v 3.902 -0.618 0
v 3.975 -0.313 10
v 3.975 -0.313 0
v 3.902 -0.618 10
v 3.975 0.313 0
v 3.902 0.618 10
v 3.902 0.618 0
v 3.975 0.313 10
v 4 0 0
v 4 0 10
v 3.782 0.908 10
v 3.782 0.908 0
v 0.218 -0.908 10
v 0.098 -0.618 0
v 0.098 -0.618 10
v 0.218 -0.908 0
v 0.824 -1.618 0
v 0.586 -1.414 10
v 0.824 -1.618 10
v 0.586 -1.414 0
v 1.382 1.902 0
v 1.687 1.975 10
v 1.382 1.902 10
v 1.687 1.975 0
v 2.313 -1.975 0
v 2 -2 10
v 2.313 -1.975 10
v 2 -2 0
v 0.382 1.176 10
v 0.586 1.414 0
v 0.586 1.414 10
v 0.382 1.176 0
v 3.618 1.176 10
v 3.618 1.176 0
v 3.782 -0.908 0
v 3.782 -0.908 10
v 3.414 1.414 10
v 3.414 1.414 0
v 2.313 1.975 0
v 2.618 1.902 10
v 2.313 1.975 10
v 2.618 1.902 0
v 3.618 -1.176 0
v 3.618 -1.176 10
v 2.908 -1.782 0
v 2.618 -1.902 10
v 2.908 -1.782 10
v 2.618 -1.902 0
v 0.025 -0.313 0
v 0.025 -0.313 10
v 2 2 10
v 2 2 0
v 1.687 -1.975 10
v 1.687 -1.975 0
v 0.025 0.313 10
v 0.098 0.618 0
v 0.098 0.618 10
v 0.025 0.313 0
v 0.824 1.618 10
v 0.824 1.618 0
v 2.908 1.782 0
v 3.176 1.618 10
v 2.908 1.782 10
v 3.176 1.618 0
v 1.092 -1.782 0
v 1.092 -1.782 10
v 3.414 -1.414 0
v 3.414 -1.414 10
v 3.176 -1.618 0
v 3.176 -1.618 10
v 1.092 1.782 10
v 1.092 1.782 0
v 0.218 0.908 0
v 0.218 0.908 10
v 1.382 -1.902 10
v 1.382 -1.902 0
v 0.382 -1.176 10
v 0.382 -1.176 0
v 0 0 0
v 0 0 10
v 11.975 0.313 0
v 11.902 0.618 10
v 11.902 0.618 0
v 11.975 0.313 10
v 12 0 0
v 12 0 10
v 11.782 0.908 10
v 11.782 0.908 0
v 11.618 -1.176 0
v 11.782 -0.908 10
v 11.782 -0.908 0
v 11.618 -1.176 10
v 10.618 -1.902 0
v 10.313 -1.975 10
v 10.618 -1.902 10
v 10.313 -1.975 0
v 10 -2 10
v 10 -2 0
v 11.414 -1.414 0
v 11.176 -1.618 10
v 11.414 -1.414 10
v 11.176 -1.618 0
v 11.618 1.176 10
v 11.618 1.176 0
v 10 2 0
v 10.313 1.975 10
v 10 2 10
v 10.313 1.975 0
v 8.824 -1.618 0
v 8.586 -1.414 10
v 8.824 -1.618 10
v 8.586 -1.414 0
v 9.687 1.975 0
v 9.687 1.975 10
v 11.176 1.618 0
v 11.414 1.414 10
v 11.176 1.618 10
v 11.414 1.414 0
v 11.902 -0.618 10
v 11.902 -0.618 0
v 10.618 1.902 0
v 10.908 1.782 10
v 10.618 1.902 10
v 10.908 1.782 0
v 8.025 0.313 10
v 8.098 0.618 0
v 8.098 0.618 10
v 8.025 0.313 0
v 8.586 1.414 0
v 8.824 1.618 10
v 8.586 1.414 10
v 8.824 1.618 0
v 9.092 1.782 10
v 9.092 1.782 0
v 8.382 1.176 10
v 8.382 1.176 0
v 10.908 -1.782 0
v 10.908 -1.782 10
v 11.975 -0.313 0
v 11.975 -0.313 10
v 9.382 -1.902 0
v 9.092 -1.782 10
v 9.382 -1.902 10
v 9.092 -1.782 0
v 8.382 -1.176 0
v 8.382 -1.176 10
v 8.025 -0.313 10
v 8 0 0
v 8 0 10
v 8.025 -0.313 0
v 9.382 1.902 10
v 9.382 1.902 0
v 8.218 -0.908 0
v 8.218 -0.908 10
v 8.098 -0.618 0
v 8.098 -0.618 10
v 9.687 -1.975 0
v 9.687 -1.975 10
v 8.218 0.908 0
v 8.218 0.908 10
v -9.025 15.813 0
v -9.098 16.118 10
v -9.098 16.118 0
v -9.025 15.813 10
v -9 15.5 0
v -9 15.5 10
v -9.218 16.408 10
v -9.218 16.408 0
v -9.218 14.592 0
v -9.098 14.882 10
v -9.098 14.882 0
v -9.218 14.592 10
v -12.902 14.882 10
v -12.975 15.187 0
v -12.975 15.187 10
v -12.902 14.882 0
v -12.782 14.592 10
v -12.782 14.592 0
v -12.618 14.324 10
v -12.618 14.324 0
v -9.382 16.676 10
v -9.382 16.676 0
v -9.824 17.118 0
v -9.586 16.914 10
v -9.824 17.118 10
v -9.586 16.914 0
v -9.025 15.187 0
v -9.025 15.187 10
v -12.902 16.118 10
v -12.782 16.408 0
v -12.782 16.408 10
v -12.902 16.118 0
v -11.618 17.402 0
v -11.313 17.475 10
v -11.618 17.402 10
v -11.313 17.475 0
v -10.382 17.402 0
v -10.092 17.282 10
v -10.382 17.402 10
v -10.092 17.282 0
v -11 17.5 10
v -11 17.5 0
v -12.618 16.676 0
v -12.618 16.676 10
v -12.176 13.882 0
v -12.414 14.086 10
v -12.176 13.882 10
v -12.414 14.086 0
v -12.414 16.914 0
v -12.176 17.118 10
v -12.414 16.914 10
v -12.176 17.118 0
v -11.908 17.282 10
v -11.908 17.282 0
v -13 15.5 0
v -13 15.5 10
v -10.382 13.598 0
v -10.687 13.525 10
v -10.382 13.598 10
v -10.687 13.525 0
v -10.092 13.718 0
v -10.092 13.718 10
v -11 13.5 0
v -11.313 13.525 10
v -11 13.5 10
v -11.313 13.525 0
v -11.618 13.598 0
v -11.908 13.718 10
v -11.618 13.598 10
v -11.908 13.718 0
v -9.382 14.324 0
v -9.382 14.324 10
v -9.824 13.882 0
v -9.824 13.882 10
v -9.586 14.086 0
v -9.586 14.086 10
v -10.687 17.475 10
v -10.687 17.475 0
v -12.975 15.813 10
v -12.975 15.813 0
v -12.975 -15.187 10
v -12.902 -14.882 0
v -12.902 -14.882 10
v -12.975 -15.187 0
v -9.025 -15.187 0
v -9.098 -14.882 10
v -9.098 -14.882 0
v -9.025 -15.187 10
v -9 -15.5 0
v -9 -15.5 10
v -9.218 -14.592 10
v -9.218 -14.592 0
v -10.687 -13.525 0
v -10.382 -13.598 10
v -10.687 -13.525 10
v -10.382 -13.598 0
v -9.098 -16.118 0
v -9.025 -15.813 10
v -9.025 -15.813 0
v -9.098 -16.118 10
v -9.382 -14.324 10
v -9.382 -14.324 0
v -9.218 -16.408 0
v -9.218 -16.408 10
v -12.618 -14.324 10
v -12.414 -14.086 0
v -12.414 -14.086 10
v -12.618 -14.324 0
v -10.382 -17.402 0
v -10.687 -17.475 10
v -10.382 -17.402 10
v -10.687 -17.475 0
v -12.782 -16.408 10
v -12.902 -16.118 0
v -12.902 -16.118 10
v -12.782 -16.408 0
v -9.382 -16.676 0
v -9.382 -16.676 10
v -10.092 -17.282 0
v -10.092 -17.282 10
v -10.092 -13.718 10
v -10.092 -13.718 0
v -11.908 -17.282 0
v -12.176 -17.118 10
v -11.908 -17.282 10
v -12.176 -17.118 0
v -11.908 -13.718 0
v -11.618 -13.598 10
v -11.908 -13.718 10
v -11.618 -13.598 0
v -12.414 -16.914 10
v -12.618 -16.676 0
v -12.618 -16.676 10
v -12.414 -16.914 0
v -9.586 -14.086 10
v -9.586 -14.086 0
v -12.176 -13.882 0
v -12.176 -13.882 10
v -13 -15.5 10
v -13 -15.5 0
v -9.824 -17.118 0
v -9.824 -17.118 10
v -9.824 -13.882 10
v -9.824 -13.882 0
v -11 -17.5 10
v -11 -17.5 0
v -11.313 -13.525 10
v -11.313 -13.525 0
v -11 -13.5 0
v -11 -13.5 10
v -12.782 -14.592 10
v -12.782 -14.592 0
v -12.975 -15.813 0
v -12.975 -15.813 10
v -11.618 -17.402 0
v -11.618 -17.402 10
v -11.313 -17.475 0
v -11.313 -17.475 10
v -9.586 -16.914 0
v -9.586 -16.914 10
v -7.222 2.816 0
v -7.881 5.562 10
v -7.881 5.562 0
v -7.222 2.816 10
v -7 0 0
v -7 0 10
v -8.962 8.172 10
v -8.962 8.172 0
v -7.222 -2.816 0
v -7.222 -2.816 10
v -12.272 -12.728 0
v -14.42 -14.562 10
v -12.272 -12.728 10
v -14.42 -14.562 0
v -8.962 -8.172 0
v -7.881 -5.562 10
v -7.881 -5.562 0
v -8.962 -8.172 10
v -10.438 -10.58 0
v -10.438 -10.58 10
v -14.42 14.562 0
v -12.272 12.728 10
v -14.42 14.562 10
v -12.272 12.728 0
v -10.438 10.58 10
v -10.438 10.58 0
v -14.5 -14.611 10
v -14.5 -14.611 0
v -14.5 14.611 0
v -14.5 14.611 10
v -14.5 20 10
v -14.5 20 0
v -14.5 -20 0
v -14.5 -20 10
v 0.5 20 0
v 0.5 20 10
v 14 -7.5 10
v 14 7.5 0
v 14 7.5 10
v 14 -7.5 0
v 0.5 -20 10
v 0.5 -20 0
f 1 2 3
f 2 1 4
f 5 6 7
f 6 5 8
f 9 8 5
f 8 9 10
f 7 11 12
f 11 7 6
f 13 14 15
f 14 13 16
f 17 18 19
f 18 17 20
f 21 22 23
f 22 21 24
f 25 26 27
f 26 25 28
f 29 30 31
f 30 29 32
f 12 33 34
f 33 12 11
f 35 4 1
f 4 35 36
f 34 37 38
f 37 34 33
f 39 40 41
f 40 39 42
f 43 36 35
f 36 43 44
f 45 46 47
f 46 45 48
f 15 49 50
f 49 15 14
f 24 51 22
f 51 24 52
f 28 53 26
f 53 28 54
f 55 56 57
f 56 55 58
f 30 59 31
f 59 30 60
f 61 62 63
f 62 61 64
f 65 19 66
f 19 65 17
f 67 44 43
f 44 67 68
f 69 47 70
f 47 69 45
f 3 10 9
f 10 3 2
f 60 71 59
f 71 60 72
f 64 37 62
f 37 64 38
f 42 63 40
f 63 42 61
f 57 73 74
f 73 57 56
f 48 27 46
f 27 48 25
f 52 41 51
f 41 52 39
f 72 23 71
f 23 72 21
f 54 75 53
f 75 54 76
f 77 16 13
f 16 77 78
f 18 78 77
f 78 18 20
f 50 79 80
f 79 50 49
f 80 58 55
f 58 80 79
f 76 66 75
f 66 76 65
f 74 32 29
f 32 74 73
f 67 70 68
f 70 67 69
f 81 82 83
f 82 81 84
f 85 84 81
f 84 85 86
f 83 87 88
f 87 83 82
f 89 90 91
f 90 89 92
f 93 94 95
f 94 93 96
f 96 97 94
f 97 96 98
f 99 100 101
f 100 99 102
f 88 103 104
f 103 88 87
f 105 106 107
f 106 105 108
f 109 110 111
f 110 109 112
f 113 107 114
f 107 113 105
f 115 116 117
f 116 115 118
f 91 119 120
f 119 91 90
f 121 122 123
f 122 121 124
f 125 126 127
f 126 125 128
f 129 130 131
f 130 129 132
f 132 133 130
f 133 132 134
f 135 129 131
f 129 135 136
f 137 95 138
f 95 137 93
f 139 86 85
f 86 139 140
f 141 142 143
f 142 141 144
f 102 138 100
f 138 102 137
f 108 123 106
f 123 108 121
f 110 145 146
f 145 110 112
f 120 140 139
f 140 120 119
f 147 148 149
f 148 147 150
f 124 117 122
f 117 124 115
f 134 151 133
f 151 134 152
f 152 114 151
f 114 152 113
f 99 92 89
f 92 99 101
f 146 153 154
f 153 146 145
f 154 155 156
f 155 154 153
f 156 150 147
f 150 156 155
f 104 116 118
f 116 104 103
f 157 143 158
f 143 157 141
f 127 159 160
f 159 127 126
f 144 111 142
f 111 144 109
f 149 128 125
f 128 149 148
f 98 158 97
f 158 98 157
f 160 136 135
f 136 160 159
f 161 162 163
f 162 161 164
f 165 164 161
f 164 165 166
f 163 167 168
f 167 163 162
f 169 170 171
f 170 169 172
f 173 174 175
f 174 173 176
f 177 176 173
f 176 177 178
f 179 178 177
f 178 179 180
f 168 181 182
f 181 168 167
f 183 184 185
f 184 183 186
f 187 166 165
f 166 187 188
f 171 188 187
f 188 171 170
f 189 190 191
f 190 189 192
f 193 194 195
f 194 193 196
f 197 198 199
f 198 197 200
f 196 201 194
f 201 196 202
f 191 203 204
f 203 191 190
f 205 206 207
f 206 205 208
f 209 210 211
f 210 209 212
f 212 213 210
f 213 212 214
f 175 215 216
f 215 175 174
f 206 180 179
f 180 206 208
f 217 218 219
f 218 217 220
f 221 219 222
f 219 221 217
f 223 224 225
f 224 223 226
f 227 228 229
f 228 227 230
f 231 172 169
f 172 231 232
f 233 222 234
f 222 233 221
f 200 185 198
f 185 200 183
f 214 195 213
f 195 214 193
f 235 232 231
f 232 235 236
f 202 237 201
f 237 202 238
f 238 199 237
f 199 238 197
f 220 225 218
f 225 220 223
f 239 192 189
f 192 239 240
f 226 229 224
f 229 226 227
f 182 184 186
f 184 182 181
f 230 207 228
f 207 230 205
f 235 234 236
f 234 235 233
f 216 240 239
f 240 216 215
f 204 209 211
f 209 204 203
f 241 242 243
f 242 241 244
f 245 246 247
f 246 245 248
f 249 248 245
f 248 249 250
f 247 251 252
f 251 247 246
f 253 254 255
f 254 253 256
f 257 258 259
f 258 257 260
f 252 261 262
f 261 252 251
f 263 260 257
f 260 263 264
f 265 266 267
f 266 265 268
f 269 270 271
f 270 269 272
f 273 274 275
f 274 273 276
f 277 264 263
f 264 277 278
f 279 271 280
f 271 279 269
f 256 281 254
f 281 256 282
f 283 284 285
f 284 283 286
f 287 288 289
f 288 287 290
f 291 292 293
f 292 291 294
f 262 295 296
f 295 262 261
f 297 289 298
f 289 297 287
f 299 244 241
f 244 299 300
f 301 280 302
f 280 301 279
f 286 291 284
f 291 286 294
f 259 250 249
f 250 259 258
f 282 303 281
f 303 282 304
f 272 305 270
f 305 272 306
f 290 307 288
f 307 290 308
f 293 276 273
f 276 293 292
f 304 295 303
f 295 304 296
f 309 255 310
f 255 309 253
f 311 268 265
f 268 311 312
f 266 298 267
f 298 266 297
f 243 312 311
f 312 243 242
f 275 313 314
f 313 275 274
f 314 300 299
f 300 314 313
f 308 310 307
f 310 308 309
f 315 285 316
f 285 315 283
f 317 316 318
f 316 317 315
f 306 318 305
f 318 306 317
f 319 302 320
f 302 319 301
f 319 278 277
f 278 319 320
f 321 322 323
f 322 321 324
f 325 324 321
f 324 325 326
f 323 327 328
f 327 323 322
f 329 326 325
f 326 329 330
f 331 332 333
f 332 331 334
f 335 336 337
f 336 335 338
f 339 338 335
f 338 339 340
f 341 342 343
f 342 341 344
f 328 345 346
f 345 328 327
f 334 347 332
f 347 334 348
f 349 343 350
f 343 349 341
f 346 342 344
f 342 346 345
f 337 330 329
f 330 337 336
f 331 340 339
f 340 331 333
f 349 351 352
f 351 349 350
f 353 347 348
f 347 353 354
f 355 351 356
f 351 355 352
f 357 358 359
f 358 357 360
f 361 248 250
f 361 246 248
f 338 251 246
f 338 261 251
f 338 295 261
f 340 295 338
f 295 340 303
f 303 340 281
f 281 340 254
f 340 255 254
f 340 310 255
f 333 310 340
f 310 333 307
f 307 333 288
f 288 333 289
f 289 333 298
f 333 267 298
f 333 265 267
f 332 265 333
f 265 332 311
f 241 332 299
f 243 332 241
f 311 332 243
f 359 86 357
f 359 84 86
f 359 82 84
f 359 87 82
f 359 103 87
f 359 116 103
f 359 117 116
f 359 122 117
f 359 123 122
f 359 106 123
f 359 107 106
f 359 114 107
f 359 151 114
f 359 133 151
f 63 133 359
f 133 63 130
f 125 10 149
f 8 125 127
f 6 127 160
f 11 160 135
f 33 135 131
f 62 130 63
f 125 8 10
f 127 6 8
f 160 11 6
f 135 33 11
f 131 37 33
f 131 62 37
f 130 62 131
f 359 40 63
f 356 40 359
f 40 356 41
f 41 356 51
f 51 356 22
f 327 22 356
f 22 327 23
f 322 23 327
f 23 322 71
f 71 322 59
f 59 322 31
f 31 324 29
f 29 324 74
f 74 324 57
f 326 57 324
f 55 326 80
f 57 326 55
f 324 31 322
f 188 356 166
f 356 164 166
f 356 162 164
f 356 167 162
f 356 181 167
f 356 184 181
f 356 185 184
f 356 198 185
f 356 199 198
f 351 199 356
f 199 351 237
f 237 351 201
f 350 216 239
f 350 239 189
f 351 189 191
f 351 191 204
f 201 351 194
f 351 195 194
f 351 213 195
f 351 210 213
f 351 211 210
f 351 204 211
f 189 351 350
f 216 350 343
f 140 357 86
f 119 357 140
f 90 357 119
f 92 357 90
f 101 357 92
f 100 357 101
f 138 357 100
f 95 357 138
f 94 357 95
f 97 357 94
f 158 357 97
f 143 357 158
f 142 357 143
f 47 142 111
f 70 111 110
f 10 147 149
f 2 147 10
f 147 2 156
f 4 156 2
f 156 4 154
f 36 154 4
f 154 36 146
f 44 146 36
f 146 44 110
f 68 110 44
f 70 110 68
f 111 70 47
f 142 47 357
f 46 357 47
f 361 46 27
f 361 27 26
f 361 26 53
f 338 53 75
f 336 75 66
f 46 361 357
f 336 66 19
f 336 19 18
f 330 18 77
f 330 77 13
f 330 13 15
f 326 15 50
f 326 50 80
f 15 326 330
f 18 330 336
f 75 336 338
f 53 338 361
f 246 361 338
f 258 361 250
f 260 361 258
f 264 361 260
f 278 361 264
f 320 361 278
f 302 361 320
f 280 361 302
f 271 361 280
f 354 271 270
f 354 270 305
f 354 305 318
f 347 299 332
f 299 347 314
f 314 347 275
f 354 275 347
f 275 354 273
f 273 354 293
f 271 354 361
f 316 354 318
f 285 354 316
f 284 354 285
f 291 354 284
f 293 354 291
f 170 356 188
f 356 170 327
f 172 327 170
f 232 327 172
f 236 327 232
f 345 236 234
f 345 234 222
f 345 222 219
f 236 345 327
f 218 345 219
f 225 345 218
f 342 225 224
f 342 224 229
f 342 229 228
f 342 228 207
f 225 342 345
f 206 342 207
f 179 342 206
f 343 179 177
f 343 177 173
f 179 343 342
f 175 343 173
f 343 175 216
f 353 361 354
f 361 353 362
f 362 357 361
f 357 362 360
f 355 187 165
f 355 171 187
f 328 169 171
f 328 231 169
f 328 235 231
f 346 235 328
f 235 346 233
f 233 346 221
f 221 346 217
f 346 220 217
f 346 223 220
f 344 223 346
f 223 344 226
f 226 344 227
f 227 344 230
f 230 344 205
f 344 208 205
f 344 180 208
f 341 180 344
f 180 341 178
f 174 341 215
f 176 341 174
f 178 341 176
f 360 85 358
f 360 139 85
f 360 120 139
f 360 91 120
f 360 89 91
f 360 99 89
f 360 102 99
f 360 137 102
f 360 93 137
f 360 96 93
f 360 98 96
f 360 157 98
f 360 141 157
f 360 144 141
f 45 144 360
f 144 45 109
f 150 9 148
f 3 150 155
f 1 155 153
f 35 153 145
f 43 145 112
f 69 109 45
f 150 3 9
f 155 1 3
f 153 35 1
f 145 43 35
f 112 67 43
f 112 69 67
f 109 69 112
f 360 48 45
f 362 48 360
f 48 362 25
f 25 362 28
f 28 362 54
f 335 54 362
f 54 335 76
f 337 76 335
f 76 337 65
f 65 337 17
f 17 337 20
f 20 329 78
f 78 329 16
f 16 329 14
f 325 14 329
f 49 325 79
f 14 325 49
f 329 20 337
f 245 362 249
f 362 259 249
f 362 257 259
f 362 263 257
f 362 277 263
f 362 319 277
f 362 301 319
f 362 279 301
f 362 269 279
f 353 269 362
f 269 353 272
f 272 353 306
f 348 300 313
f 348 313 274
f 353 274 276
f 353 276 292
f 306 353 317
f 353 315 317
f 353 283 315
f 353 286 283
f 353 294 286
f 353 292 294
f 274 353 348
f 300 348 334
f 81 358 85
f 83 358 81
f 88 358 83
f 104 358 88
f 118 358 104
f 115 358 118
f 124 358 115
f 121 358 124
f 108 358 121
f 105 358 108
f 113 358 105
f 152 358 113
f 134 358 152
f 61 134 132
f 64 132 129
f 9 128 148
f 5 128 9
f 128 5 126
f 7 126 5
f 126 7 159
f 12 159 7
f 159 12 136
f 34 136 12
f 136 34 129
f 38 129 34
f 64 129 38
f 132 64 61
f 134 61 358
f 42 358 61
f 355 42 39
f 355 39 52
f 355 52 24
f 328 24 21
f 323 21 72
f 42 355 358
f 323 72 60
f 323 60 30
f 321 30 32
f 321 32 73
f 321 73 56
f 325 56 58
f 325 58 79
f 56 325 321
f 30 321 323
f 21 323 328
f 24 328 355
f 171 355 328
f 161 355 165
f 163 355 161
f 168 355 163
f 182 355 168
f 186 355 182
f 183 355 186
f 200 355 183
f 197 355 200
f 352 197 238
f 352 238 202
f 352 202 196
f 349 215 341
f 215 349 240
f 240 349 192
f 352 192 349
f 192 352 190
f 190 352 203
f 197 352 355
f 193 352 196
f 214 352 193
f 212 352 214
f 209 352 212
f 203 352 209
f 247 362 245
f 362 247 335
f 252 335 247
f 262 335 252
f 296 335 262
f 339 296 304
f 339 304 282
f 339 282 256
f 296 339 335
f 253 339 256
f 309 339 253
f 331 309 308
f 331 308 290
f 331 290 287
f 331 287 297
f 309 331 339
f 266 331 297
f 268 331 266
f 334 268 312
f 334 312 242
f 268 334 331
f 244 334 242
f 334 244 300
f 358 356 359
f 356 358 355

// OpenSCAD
$fn=40;
*
#import(file="C:/Users/bkuker/drawing.svg", center=true);


difference(){
    hull(){
        translate([0,0,5]){ 
            cube([28,15,10],true);
            translate([-7,0,0])
                cube([15,40,10],true);
        }
    }

    translate([0,0,-5]){ 
        translate([2,0,0]){
            cylinder(h=20,r=2);
            translate([8,0,0]){
                cylinder(h=20,r=2);
            }
        }

        translate([-11,31/2,0]){
            cylinder(h=20,r=2);
        }

        translate([-11,-31/2,0]){
            cylinder(h=20,r=2);
        }

        translate([-25,0,0]){
            cylinder(h=20,r=18);
        }
    }
}
